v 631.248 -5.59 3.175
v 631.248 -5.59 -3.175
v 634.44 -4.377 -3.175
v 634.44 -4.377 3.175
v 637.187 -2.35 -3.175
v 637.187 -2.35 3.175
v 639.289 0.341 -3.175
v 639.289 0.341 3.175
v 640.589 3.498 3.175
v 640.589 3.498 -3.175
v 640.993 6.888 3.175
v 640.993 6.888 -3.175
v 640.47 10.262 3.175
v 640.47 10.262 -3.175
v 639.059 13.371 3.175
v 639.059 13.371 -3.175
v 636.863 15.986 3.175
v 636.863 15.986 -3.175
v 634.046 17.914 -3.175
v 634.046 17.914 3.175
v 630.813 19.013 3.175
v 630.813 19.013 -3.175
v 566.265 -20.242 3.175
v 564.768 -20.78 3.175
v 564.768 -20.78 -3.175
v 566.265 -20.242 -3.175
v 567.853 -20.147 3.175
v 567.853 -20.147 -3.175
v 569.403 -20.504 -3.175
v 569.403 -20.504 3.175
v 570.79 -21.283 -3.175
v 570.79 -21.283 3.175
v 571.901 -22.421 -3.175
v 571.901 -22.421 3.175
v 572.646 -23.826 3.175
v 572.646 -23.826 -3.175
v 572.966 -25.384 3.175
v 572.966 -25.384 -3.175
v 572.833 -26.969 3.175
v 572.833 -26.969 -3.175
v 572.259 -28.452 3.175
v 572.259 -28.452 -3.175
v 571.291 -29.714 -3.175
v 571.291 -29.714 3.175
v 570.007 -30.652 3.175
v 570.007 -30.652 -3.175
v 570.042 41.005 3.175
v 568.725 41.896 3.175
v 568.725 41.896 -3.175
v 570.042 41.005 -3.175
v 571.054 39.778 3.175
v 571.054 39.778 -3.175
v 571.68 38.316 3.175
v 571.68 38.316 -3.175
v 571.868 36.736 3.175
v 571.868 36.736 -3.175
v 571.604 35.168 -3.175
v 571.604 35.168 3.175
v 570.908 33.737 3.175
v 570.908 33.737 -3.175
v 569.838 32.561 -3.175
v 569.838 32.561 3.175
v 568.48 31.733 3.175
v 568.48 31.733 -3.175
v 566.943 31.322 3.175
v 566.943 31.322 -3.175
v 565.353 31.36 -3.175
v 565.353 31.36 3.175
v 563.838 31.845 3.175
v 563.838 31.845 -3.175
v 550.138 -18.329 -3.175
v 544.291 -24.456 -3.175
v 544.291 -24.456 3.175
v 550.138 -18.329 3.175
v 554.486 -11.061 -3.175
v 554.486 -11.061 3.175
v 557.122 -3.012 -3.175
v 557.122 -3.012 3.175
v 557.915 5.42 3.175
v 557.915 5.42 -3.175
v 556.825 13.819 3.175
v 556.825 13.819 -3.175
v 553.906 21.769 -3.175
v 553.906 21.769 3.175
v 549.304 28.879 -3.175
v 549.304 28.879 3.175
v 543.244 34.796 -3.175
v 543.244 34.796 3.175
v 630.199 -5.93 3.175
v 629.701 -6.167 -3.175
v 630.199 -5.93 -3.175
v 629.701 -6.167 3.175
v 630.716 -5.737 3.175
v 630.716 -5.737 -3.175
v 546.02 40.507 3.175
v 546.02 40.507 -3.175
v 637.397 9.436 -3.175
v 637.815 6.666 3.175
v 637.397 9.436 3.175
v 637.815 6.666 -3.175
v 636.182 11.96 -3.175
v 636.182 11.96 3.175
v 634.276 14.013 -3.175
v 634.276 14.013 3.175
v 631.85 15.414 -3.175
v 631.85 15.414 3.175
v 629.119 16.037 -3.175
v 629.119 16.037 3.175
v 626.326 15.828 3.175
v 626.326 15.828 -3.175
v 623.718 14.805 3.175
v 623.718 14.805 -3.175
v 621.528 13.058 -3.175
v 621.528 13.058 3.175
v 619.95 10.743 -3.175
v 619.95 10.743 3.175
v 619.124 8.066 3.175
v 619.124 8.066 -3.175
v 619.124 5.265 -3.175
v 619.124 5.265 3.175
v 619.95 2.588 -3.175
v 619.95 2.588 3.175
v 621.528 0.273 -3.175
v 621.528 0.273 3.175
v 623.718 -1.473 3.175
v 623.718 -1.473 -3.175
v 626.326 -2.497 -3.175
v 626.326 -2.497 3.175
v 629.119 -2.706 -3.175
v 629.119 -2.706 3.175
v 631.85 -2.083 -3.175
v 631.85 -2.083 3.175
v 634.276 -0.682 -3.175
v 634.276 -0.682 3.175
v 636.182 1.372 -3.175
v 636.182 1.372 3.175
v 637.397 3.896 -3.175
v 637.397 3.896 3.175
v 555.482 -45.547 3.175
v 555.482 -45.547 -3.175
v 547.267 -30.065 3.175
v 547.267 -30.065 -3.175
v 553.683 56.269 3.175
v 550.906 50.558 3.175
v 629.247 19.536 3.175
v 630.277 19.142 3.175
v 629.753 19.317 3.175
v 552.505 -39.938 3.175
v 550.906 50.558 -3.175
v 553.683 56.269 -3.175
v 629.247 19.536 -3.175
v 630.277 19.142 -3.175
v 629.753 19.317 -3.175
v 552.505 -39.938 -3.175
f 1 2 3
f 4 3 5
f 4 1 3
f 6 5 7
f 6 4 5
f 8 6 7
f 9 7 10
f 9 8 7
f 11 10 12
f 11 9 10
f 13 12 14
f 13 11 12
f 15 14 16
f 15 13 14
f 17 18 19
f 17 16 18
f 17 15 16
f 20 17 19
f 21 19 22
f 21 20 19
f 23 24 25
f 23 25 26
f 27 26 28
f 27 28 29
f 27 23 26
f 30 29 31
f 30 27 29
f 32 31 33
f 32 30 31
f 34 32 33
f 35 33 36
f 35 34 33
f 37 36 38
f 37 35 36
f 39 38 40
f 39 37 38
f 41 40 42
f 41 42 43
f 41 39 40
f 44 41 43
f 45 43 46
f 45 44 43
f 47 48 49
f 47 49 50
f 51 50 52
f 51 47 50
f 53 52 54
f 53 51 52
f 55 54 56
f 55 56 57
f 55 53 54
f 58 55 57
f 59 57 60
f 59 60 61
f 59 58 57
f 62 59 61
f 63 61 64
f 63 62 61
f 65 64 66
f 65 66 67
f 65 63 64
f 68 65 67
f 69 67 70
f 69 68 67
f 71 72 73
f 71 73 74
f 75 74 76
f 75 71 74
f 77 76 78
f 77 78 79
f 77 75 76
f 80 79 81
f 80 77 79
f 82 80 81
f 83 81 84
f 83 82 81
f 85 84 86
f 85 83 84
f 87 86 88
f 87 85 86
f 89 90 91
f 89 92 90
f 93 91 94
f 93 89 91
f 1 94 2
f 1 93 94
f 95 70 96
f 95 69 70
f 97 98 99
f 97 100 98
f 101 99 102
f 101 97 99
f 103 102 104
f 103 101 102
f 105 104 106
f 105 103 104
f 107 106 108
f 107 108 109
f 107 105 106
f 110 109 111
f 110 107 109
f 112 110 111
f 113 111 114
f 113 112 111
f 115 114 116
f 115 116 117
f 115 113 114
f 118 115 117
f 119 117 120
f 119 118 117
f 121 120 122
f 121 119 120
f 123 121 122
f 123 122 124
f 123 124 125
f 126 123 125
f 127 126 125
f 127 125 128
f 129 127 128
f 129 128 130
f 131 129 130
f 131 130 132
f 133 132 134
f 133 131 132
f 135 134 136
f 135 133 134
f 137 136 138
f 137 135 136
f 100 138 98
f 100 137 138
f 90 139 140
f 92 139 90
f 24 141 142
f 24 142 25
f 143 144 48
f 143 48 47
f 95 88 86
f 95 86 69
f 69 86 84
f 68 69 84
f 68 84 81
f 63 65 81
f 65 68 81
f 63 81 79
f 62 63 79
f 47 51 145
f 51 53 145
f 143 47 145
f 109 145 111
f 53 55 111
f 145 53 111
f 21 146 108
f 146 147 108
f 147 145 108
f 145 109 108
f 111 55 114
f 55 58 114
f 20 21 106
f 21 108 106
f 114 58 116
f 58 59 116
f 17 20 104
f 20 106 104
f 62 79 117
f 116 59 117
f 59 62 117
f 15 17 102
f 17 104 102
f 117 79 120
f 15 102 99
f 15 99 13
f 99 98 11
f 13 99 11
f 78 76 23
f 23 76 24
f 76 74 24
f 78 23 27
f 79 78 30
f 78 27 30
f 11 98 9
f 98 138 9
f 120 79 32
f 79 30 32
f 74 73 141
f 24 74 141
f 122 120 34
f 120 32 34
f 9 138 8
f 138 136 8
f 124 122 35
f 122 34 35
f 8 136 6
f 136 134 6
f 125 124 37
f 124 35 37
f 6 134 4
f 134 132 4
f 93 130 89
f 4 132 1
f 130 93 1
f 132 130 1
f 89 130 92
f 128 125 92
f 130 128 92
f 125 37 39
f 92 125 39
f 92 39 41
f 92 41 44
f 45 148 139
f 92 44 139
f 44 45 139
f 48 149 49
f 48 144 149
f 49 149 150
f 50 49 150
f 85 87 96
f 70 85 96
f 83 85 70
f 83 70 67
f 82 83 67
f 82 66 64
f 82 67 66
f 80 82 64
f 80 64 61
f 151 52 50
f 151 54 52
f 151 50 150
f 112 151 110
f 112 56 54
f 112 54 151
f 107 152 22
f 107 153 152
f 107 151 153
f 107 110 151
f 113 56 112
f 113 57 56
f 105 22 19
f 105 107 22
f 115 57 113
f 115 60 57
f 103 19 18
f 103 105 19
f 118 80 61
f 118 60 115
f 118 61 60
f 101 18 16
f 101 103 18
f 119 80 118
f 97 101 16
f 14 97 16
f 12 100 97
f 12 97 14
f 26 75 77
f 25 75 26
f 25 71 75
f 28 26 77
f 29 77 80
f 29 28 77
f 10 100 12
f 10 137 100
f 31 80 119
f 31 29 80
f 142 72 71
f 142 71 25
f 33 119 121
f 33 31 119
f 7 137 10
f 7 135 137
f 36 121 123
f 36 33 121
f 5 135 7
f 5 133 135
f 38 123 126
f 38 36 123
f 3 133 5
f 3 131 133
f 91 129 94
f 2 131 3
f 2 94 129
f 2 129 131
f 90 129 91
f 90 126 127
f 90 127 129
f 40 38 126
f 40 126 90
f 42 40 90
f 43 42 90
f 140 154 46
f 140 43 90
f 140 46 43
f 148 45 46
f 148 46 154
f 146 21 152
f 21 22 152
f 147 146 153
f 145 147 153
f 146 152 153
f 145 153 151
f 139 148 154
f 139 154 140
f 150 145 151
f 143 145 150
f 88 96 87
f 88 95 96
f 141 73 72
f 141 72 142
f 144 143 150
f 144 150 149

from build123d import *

# Parameters (mm, degrees)
SKETCH1_R           = 12.578
SKETCH1_R_2         = 9.398
BOSS_EXTRUDE1_DEPTH = 3.175
FILLET1_R           = 38.1
FILLET2_R           = 6.35


with BuildPart() as part:
    # Sketch1 → Boss-Extrude1 (new, symmetric)
    # profile 1 of 4: a face of its own
    with BuildSketch(Plane.XY):
        with BuildLine():
            Line((550.906377784, 50.55819174), (568.724608053, 41.896435909))
            ThreePointArc((568.724608053, 41.896435909), (571.307203408, 34.427721881), (563.838489379, 31.845126527))
            Line((563.838489379, 31.845126527), (546.02025911, 40.506882357))
            Line((546.02025911, 40.506882357), (543.244055318, 34.795911117))
            Line((543.244055318, 34.795911117), (602.068897859, 6.200118203))
            Line((602.068897859, 6.200118203), (619.322536705, 15.354662769))
            ThreePointArc((619.322536705, 15.354662769), (624.245533427, 18.531839743), (630.07371037, 19.134088663))
            Line((630.07371037, 19.134088663), (553.682581576, 56.26916298))
            Line((553.682581576, 56.26916298), (550.906377784, 50.55819174))
        make_face()
    # profile 2 of 4: a face of its own
    with BuildSketch(Plane.XY):
        with BuildLine():
            ThreePointArc((619.635184113, -2.3391632), (615.840878926, 6.443467165), (619.322536705, 15.354662769))
            Line((619.322536705, 15.354662769), (602.068897859, 6.200118203))
            Line((602.068897859, 6.200118203), (619.635184113, -2.3391632))
        make_face()
    # profile 3 of 4: a face of its own
    with BuildSketch(Plane.XY):
        with Locations((628.416915809, 6.665683962)):
            Circle(SKETCH1_R)
        with Locations((628.416915809, 6.665683962)):
            Circle(SKETCH1_R_2, mode=Mode.SUBTRACT)
    # profile 4 of 4: a face of its own
    with BuildSketch(Plane.XY):
        with BuildLine():
            Line((619.635184113, -2.3391632), (602.068897859, 6.200118203))
            Line((602.068897859, 6.200118203), (544.291028723, -24.456028169))
            Line((544.291028723, -24.456028169), (547.267260579, -30.065354683))
            Line((547.267260579, -30.065354683), (564.768359303, -20.779511294))
            ThreePointArc((564.768359303, -20.779511294), (572.323650668, -23.096634594), (570.006527369, -30.651925959))
            Line((570.006527369, -30.651925959), (552.505428645, -39.937769348))
            Line((552.505428645, -39.937769348), (555.4816605, -45.547095862))
            Line((555.4816605, -45.547095862), (630.513168482, -5.736404924))
            ThreePointArc((630.513168482, -5.736404924), (624.667353131, -5.3404338), (619.635184113, -2.3391632))
        make_face()
    extrude(amount=BOSS_EXTRUDE1_DEPTH, both=True)

    # Fillet1
    # the kernel refuses this fillet: 38.1 mm, written as the material it adds along each edge
    with BuildSketch(Plane(origin=(602.068897859, 6.200118203, -3.175), x_dir=(-0.8993655496308585, 0.43719744754193623, 0), z_dir=(0, 0, 1))) as fillet1_piece_1:
        with BuildLine():
            CenterArc((73.33595186, 37.265834599), FILLET1_R, 155.886500773, 102.102011478)
            Line((38.560636086, 52.831418843), (0, 0))
            Line((0, 0), (65.407044516, 0))
        make_face()
    extrude(amount=6.35)

    # Fillet2
    fillet2_edges = [part.edges().sort_by_distance(p)[0] for p in [
        (630.07371037, 19.134088663, 0),
        (630.513168482, -5.736404924, 0),
    ]]
    fillet(fillet2_edges, radius=FILLET2_R)


solid = part.part
